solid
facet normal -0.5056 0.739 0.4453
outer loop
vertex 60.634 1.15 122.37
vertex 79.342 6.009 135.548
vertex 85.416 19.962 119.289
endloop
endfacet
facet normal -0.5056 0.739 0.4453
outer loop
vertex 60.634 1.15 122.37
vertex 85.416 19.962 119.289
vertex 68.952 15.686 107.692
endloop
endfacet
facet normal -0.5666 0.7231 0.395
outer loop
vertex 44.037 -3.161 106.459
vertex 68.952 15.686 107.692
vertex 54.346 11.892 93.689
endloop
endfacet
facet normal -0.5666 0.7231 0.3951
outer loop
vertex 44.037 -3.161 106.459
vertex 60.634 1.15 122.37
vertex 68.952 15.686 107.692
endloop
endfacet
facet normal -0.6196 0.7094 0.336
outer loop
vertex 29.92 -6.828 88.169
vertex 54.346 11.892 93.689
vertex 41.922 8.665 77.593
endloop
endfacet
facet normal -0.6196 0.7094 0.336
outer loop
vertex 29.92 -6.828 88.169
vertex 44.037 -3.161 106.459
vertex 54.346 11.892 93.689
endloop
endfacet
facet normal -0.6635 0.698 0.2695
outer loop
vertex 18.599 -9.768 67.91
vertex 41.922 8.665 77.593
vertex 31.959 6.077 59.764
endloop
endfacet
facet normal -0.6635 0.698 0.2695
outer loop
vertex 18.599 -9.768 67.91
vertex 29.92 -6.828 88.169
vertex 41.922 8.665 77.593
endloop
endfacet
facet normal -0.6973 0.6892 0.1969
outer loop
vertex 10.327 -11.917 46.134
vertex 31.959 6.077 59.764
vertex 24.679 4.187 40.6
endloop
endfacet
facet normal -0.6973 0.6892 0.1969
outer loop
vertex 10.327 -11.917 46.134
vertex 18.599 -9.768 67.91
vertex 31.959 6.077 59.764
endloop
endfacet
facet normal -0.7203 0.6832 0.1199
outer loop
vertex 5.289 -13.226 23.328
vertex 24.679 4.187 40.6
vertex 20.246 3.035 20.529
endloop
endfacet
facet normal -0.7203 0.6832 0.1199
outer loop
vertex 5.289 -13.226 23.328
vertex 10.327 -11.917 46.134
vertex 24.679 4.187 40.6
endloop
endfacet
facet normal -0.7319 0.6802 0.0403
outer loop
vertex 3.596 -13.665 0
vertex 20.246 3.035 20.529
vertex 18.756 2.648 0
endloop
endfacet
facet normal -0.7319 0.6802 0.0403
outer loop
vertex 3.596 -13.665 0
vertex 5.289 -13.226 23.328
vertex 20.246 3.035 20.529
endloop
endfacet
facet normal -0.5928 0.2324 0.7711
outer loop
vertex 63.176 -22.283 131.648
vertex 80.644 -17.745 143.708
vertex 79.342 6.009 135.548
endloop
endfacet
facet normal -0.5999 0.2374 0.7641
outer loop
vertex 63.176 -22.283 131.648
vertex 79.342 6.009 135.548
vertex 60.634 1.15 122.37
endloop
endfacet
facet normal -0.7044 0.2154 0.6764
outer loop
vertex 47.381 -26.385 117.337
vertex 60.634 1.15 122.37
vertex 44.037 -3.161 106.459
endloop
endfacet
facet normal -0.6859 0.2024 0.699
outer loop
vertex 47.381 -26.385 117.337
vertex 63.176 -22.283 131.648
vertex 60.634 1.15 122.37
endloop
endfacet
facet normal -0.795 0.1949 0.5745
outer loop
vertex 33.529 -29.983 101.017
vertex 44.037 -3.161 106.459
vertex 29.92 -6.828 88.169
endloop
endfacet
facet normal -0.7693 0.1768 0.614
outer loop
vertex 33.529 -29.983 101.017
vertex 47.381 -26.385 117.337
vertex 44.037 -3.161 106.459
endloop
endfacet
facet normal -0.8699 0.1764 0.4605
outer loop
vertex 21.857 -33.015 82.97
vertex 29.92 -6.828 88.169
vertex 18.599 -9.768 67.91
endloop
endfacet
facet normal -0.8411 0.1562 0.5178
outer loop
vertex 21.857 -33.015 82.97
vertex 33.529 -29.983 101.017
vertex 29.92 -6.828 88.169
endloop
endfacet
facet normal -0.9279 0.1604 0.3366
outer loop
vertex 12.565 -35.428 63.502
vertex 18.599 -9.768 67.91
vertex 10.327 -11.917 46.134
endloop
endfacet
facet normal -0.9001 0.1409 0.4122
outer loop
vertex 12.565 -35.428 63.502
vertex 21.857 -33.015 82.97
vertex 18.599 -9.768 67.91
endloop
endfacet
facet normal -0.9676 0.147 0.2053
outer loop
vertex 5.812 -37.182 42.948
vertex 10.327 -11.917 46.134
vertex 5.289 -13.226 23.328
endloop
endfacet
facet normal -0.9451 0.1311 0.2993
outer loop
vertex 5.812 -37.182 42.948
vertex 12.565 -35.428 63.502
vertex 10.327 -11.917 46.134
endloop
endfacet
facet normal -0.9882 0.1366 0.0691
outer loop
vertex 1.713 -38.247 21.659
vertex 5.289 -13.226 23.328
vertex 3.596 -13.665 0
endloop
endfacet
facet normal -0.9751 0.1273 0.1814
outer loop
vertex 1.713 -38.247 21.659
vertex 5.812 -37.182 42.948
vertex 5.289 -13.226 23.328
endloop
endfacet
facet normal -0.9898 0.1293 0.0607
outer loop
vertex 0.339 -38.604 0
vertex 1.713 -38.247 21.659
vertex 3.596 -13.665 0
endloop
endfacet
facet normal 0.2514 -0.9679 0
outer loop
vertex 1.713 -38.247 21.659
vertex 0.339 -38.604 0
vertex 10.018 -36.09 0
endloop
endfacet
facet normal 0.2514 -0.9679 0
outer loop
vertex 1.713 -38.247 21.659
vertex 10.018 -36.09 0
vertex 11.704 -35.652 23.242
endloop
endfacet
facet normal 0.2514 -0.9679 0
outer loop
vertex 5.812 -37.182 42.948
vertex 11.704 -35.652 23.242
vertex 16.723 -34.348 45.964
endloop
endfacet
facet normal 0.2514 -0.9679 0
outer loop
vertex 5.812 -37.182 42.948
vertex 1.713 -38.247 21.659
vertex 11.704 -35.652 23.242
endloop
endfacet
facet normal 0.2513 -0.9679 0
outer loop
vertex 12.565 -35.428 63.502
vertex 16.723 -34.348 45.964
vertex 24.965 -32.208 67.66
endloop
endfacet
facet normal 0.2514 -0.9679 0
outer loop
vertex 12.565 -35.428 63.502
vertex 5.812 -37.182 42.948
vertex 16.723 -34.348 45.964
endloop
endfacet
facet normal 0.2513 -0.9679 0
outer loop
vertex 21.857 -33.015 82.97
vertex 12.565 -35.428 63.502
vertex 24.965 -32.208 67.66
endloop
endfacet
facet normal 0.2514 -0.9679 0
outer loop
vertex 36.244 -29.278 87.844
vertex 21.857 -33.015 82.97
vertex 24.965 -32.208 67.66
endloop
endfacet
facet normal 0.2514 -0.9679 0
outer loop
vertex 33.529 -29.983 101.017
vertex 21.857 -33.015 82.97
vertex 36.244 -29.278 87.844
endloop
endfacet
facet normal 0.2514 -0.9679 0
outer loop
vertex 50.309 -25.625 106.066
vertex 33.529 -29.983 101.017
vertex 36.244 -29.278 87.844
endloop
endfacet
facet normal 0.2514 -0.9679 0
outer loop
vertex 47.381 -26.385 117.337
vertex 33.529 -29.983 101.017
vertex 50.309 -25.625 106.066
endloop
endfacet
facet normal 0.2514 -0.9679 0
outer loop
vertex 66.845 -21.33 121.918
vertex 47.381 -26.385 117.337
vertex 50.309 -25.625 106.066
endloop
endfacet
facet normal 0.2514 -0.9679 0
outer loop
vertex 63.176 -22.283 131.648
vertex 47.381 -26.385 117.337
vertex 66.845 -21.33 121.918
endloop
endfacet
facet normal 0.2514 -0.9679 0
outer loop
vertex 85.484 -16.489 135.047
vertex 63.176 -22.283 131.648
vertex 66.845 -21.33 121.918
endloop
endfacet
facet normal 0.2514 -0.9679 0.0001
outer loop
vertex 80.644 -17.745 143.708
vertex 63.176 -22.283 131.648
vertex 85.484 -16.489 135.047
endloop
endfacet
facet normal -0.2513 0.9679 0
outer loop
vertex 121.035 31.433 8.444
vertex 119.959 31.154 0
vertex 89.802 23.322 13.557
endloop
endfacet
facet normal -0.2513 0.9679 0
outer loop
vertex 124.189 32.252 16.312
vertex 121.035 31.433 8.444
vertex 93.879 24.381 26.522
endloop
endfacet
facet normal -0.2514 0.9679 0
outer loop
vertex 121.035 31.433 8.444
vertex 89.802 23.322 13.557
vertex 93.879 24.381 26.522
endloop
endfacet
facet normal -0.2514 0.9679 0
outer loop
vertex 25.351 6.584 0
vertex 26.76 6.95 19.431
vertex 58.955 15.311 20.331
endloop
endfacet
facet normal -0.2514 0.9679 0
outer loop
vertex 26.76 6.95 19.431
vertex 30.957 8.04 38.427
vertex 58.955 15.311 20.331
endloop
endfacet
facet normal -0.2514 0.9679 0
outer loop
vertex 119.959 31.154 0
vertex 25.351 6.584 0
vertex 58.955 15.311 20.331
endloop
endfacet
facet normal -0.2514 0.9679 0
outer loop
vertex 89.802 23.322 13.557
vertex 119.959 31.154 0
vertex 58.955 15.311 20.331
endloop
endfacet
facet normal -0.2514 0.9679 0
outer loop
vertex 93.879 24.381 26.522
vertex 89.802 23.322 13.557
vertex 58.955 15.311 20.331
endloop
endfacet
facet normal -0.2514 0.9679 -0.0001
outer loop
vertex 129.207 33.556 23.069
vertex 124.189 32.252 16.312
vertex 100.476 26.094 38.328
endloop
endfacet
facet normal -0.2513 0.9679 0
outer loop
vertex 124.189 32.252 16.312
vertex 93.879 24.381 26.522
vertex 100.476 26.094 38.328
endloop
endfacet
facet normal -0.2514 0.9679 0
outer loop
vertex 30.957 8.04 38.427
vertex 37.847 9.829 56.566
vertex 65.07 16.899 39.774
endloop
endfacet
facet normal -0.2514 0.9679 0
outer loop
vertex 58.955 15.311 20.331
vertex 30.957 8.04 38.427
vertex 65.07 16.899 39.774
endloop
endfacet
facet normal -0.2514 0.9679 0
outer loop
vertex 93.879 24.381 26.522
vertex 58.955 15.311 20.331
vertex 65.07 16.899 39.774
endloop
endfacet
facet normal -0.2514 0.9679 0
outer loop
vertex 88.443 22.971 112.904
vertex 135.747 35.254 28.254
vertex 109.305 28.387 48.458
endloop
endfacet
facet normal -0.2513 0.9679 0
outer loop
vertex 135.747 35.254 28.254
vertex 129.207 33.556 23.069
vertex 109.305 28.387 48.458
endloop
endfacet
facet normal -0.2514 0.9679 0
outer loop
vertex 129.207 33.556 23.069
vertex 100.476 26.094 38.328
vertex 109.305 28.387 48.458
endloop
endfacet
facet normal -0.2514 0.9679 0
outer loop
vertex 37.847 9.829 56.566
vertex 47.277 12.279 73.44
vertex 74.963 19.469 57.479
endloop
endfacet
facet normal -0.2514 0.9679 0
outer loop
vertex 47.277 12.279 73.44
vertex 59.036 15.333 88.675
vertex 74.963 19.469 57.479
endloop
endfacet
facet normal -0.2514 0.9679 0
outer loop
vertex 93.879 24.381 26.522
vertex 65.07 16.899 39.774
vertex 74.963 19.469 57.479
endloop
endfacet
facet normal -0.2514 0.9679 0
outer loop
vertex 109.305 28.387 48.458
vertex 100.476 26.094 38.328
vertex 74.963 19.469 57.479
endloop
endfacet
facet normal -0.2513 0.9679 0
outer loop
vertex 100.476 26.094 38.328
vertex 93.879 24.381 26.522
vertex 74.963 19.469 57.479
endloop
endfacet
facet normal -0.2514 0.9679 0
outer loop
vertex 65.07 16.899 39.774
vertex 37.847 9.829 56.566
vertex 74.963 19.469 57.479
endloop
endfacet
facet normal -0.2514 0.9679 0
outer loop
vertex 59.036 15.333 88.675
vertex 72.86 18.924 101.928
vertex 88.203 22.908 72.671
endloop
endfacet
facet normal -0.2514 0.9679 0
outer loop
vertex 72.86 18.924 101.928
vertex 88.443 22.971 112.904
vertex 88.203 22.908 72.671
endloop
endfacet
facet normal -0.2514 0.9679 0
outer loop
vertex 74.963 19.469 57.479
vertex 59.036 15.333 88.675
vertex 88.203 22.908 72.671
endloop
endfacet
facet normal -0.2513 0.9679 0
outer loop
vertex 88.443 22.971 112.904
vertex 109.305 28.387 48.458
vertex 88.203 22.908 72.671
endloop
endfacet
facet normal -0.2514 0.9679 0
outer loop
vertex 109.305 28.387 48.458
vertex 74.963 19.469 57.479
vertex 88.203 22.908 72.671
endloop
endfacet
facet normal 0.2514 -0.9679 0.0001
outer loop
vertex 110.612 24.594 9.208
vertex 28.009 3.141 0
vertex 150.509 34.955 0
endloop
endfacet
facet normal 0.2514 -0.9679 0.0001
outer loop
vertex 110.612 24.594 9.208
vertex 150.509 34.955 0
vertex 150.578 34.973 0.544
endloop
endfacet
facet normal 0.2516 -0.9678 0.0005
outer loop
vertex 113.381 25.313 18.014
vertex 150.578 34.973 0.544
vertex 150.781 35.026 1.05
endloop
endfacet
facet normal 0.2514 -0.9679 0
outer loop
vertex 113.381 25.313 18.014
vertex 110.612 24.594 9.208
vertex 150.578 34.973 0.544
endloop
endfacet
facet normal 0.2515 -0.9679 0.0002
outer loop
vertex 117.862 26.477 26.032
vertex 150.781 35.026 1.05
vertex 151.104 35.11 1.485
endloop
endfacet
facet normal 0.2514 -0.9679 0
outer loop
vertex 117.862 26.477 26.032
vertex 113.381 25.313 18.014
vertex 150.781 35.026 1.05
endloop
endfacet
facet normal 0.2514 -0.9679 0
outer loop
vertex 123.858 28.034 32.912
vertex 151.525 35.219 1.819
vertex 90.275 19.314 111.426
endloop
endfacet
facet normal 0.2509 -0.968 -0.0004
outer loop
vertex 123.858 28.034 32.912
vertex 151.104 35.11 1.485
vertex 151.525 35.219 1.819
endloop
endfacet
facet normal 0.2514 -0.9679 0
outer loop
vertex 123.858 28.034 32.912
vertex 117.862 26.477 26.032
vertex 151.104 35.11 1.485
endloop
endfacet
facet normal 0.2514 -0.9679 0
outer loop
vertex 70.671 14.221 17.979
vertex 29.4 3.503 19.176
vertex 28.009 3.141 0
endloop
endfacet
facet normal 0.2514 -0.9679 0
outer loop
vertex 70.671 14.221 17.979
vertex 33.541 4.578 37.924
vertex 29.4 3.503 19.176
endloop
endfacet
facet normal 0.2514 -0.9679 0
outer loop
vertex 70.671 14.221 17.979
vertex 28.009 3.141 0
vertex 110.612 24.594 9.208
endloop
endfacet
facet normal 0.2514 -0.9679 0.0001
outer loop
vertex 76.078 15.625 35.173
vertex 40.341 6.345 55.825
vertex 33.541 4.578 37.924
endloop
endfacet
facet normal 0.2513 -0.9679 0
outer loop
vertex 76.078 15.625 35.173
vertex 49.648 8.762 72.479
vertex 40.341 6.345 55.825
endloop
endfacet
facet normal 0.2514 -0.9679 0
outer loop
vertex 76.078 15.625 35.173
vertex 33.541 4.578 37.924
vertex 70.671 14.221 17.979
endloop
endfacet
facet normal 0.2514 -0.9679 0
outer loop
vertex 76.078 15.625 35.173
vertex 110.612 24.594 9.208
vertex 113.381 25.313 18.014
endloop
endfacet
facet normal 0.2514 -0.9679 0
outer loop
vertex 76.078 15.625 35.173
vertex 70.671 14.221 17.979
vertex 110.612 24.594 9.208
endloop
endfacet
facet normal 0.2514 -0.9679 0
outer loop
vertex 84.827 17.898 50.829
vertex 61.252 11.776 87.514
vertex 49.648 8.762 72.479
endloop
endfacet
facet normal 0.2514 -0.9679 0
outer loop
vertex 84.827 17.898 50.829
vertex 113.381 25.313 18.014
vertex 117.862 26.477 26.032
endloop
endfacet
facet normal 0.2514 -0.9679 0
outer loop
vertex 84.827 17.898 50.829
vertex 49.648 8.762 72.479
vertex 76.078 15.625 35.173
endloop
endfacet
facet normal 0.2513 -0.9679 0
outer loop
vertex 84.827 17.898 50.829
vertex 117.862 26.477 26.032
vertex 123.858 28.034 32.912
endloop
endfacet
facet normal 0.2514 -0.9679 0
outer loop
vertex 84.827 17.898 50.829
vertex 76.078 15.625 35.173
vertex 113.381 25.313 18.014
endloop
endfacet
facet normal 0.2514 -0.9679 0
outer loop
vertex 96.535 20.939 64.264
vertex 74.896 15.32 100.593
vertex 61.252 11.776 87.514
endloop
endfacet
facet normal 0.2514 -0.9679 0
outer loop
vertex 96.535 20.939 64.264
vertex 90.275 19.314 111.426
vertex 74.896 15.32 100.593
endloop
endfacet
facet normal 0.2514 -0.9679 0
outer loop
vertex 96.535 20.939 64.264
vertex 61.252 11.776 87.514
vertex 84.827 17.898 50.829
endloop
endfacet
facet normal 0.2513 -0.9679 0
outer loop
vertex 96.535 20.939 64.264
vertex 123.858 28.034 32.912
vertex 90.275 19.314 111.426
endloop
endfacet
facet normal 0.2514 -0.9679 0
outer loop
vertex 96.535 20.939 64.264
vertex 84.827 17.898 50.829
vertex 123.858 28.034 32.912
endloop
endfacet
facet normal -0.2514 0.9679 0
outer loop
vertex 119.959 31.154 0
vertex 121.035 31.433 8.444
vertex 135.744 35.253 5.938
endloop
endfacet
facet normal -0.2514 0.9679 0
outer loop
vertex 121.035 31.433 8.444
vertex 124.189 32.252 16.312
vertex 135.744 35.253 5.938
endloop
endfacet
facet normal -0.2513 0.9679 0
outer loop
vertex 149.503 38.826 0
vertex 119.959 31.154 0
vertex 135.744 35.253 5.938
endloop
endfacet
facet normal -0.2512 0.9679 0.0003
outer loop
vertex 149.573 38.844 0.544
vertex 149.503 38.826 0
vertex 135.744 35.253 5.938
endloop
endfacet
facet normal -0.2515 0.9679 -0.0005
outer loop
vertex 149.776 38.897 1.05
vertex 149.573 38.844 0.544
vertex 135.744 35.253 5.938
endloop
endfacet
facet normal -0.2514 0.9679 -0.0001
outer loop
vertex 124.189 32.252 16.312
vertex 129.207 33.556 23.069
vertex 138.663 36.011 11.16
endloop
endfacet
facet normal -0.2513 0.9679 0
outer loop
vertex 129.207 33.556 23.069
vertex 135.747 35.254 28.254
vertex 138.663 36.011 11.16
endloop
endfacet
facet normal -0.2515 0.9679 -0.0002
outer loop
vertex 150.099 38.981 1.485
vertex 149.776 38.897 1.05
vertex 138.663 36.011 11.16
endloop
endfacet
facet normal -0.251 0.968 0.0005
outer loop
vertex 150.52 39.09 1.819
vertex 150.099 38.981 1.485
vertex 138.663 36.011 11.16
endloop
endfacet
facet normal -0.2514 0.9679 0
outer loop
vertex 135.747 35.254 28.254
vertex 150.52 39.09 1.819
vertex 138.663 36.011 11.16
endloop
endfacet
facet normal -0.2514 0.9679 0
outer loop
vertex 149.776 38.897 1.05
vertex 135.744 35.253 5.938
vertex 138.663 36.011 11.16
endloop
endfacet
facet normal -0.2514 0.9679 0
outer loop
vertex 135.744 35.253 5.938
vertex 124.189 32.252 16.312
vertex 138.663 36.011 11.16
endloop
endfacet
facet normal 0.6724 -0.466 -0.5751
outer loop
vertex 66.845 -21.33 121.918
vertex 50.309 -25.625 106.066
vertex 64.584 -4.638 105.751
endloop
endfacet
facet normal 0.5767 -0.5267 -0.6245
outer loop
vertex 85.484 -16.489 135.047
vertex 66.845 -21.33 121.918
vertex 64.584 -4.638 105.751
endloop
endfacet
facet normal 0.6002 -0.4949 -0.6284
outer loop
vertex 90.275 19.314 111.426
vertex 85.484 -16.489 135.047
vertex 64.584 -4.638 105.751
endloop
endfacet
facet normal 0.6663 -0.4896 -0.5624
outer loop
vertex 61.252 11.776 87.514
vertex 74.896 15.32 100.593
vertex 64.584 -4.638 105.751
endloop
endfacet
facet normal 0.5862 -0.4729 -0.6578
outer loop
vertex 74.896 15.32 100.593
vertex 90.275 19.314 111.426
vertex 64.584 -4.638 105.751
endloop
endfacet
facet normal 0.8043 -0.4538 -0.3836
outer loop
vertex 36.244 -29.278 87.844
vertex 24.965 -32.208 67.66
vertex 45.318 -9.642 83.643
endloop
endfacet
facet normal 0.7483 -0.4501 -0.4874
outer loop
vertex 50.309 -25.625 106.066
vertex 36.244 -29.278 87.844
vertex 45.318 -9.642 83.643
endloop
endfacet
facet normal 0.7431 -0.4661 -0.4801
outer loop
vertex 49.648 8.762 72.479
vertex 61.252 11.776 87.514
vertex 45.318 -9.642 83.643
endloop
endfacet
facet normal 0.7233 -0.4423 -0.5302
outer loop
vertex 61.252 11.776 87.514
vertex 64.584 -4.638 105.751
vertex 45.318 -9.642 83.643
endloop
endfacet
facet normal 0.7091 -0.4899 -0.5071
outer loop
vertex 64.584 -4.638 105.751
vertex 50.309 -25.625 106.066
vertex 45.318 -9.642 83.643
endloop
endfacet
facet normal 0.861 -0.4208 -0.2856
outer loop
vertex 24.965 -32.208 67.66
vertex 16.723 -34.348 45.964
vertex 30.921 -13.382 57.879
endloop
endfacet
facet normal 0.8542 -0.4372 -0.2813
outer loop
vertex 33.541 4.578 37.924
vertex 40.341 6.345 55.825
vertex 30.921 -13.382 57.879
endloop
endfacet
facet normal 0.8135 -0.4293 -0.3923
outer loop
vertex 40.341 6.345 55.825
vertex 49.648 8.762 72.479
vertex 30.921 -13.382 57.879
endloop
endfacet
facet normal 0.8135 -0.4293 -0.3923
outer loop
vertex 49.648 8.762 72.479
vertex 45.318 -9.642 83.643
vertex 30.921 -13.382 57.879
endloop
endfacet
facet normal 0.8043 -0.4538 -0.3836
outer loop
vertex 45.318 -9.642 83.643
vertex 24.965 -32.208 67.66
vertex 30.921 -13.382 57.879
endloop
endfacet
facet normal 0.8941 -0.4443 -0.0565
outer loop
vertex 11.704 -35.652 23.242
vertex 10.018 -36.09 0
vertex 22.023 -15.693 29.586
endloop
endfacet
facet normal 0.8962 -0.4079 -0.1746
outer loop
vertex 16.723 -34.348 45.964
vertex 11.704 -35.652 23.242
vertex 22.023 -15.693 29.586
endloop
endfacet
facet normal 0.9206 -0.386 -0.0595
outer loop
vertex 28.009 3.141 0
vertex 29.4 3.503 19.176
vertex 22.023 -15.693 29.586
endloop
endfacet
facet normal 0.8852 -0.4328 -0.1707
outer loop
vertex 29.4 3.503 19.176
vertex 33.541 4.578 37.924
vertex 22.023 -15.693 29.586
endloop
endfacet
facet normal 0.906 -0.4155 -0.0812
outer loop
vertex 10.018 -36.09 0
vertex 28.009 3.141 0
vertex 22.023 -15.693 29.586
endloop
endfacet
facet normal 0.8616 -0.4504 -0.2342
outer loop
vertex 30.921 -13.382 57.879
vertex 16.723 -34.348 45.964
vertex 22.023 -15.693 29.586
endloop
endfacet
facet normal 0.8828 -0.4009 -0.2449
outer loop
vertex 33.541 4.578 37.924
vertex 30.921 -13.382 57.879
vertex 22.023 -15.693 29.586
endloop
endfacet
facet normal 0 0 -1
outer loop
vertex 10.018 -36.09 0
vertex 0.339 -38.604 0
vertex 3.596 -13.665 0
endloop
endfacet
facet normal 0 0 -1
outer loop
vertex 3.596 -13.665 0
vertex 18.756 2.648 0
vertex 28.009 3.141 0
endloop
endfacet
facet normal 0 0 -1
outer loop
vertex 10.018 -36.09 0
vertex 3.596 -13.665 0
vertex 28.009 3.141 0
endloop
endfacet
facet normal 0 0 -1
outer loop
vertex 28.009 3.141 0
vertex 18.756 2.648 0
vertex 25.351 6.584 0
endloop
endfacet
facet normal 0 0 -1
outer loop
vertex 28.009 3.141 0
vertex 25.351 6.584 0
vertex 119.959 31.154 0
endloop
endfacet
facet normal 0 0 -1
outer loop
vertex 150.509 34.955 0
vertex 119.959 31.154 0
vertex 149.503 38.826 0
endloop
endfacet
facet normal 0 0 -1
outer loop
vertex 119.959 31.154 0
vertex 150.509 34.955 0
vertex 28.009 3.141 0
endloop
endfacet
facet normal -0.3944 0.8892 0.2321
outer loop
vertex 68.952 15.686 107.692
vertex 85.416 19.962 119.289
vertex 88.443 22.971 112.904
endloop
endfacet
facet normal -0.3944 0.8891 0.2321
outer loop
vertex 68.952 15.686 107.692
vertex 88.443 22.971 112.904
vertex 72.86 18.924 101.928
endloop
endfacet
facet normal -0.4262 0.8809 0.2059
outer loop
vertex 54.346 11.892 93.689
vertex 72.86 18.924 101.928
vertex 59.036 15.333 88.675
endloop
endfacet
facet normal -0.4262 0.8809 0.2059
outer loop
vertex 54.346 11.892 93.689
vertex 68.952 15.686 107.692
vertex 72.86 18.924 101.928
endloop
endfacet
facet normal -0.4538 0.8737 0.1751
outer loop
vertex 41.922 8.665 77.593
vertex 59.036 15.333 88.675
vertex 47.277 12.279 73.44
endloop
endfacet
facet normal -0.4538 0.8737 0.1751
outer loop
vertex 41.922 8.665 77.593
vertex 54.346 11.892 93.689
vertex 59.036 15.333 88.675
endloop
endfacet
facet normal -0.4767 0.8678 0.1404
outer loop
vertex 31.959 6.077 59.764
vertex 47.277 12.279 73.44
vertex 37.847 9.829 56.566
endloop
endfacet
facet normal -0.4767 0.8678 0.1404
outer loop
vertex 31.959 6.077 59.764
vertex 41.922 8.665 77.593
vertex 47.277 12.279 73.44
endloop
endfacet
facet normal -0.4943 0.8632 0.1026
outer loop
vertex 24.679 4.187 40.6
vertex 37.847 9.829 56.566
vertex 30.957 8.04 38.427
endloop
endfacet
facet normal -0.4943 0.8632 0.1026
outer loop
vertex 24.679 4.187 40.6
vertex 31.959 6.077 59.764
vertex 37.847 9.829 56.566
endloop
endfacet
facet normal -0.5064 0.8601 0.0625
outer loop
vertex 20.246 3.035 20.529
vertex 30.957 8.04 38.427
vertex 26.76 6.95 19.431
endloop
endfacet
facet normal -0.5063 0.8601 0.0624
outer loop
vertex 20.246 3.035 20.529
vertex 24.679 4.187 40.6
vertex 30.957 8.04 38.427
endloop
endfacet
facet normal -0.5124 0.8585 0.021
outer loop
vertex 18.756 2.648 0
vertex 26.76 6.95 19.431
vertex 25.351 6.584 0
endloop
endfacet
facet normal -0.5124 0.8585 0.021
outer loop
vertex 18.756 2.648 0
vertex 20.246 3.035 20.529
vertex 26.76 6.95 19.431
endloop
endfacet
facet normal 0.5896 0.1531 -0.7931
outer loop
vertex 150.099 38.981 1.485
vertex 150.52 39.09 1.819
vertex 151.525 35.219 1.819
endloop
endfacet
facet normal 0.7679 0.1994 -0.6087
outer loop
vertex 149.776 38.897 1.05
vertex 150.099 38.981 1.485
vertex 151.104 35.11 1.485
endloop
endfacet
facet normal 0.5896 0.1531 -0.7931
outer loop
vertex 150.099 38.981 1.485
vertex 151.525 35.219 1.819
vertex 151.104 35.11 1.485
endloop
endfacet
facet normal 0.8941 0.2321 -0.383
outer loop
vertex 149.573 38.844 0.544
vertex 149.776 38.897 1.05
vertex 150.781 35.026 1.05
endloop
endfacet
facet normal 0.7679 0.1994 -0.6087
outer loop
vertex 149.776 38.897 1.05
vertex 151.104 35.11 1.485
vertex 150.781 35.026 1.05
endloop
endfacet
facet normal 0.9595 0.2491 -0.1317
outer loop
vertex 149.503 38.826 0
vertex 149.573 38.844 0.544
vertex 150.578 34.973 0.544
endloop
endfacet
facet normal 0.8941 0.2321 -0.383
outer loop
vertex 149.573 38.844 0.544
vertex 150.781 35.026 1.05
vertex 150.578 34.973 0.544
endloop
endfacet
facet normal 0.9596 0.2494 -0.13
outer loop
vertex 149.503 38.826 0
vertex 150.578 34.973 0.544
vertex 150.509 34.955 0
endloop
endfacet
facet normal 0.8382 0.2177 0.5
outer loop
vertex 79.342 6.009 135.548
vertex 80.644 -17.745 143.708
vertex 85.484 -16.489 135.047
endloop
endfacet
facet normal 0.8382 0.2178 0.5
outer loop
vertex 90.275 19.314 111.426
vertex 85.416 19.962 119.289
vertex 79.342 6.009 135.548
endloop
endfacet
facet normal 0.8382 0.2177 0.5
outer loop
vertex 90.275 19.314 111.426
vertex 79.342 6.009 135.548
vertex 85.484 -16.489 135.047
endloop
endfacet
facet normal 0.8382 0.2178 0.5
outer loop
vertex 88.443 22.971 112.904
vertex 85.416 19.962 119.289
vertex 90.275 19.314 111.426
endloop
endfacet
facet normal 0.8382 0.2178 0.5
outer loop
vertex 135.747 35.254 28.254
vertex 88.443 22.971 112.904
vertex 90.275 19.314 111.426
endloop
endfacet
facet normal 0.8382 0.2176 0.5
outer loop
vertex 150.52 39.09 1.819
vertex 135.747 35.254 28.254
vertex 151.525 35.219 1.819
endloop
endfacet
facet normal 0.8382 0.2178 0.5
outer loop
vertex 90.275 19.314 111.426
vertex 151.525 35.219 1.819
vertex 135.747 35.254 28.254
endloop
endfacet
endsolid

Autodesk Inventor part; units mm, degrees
ref_plane "YZ Plane" through (0, 0, 0) normal (1, 0, 0) x (0, 1, 0)
ref_plane "XZ Plane" through (0, 0, 0) normal (0, 1, 0) x (-1, 0, 0)
ref_plane "XY Plane" through (0, 0, 0) normal (0, 0, 1) x (1, 0, 0)
sketch "Sketch1" plane through (0, 0, 0) normal (0, 0, 1) x (1, 0, 0)
  line L0 (18.7565, 2.6482) -> (25.351, 6.5837) projected
  line L1 (18.7565, 2.6482) -> (3.5965, -13.665) projected
  line L2 (0.3391, -38.6037) -> (3.5965, -13.665) projected
  line L3 (10.018, -36.0901) -> (0.3391, -38.6037) projected
  line L4 (28.0088, 3.1413) -> (10.018, -36.0901) projected
  line L5 (150.5088, 34.9549) -> (28.0088, 3.1413) projected
  line L6 (149.5033, 38.8265) -> (150.5088, 34.9549) projected
  line L7 (25.351, 6.5837) -> (119.9587, 31.1536) projected
  line L8 (152.5414, 35.4828) -> (151.49, 39.5312) construction
  line L9 (119.9587, 31.1536) -> (149.5033, 38.8265) projected
  point P0 (0, 0)
revolve "Revolution1" add sketch "Sketch1" angle 60 about axis through (152.5414, 35.4828, 0) along (-0.2514, 0.9679, 0)
properties part number "Head_RightPanel_Bottom"
